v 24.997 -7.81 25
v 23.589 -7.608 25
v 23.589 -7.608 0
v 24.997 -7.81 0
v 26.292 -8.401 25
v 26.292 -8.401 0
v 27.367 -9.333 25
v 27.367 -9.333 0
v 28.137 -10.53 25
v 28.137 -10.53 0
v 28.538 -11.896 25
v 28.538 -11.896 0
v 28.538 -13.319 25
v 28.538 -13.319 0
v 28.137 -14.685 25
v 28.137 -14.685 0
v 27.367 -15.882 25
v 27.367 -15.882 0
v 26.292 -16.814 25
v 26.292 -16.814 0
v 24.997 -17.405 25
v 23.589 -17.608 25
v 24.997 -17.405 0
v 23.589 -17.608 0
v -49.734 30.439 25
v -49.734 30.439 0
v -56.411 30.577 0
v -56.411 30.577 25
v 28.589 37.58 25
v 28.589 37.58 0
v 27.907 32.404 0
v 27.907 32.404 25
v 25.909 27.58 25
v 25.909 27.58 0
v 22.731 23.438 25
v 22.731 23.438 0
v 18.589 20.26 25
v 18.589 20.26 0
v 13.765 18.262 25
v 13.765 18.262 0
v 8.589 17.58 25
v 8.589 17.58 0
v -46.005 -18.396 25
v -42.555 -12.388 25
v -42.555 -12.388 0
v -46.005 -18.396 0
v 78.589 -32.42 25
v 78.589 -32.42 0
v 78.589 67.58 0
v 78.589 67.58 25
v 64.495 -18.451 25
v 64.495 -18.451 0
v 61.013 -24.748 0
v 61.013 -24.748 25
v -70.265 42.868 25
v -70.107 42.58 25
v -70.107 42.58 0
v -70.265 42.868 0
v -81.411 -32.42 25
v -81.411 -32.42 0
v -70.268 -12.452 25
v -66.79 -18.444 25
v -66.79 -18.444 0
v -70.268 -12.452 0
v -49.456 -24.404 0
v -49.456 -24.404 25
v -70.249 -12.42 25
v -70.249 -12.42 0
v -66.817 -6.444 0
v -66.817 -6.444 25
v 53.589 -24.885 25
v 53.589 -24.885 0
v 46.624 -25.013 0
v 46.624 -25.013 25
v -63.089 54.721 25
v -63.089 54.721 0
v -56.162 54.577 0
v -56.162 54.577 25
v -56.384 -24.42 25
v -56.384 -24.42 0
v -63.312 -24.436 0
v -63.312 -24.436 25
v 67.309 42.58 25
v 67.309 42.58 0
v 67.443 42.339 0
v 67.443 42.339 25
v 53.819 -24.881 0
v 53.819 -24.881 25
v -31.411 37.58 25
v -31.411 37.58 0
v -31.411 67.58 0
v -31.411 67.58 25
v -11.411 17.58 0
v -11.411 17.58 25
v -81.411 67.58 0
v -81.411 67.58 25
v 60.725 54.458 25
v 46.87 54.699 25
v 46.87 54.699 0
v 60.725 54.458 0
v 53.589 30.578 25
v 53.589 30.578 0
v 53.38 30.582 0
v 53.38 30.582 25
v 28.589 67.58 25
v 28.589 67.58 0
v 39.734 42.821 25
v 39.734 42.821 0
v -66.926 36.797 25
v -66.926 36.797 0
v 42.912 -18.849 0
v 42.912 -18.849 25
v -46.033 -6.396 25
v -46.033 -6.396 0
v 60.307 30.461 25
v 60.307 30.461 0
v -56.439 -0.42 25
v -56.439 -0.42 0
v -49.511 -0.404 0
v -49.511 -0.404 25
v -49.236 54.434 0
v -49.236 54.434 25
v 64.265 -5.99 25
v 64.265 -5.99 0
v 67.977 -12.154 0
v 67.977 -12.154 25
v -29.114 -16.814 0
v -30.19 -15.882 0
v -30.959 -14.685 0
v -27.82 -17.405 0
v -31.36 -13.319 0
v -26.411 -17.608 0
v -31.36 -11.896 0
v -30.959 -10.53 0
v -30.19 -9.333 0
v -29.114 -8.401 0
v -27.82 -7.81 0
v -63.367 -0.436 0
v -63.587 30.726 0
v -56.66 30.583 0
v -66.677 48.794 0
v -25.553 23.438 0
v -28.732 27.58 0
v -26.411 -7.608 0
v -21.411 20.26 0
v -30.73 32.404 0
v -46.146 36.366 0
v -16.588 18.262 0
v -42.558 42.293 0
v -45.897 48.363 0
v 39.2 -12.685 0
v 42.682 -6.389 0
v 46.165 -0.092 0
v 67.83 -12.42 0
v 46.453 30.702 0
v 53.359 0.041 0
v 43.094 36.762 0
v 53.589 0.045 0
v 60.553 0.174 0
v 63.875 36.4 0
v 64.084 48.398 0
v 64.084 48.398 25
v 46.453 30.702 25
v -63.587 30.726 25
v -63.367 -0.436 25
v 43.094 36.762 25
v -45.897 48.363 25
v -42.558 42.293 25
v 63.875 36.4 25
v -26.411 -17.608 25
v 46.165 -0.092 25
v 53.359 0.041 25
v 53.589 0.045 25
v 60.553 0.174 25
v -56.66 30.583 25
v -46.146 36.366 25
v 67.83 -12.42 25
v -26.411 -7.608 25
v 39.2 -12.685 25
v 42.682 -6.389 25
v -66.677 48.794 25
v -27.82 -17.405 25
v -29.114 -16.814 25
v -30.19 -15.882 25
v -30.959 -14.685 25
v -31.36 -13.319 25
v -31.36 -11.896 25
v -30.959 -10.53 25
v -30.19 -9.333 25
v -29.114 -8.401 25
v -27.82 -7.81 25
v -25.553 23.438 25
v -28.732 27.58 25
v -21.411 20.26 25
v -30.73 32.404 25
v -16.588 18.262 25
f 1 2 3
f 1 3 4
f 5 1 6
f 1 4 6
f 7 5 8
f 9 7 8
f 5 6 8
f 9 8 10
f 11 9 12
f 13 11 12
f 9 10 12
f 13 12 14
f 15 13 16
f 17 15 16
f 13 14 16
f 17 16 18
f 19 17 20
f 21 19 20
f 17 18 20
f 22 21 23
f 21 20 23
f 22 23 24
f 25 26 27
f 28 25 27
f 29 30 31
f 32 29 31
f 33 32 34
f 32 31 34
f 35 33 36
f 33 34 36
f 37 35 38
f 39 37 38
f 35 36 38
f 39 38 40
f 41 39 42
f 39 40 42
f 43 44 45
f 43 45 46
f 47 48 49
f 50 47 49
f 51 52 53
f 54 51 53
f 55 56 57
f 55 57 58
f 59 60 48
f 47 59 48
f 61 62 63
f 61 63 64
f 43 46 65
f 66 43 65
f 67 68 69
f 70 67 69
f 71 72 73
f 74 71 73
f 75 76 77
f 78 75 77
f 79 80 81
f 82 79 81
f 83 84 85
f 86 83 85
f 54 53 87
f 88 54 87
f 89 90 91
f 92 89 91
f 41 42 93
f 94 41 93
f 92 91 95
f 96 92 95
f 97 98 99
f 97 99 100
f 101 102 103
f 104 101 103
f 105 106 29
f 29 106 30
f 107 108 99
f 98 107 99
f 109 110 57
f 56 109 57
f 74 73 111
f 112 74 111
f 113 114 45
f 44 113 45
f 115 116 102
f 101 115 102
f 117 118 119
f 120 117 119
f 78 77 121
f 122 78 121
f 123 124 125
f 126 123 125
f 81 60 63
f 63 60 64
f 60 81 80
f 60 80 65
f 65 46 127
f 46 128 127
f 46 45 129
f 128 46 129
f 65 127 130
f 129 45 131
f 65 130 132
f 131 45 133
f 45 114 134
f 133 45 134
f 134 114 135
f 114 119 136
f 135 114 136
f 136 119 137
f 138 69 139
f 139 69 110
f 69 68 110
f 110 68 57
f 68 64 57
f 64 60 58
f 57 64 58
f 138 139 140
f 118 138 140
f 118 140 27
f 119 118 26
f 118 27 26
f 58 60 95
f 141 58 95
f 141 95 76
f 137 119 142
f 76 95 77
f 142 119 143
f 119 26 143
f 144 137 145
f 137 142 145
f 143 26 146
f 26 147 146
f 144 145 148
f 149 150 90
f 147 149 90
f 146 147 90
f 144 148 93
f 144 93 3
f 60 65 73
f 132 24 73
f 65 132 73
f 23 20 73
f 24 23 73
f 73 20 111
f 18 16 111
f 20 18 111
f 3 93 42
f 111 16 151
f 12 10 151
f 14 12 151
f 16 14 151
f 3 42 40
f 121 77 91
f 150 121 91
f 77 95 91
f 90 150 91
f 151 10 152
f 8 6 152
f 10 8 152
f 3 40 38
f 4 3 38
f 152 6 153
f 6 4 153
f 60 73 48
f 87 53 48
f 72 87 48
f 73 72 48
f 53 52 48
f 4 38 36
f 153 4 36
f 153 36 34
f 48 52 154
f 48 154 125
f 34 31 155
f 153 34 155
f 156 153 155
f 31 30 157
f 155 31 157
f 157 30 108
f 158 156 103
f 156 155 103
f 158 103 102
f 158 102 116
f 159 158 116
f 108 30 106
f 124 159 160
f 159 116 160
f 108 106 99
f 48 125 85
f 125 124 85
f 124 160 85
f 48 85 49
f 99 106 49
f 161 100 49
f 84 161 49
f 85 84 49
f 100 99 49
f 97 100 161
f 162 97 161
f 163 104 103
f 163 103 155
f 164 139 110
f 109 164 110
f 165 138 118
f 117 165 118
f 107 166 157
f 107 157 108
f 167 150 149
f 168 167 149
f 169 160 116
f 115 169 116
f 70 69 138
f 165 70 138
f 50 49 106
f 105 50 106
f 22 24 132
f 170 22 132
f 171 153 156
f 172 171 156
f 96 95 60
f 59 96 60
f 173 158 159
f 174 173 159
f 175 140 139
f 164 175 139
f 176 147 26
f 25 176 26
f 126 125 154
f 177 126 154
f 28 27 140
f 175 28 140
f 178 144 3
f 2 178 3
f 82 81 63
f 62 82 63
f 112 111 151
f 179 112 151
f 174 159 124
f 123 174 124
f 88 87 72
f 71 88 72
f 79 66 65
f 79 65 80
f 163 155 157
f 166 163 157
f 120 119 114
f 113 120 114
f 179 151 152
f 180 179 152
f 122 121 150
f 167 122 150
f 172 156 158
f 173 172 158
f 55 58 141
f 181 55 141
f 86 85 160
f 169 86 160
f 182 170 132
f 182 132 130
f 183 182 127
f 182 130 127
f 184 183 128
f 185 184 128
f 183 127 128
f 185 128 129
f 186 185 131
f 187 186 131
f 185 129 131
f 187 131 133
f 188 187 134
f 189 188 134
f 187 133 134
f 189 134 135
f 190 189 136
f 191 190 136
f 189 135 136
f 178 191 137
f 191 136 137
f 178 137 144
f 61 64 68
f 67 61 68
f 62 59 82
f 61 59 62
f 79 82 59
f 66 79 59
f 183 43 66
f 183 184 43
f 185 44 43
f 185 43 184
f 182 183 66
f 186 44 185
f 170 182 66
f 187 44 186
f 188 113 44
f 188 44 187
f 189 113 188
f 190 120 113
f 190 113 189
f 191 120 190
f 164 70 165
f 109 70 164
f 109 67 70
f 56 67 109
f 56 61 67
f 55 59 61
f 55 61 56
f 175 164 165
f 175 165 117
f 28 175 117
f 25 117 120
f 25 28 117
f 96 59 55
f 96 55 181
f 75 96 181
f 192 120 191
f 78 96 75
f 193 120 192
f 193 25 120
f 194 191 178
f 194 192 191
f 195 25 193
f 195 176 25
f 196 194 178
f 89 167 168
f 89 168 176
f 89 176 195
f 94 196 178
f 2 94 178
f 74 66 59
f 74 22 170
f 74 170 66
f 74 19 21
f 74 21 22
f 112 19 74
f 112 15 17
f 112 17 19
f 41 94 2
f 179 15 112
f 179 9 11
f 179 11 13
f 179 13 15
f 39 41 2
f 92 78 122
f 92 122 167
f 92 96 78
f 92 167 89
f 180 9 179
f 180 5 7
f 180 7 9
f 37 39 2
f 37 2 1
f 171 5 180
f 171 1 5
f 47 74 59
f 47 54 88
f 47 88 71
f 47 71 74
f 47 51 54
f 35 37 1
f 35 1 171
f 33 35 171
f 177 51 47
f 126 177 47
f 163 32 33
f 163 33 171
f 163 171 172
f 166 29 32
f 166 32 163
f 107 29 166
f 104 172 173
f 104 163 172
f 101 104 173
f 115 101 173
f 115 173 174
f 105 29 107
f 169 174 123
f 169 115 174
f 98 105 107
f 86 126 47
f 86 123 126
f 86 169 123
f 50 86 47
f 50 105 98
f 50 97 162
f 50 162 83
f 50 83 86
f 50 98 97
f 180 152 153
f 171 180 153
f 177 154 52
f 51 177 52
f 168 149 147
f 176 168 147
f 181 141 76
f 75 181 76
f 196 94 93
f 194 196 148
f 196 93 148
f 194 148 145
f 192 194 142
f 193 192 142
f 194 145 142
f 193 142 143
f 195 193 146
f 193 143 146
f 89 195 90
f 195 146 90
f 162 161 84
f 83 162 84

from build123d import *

# Parameters (mm, degrees)
F1_DEPTH = 25


with BuildPart() as f1:
    # F0 (on Top) → F1 (new body)
    with BuildSketch(Plane.XY):
        with BuildLine():
            Line((-31.411291, 67.580059), (-81.411291, 67.580059))
            Line((-81.411291, 67.580059), (-81.411291, 42.580059))
            Line((-81.411291, 42.580059), (-81.411291, -6.443731))
            Line((-81.411291, -6.443731), (-81.411291, -12.419941))
            Line((-81.411291, -12.419941), (-81.411291, -32.419941))
            Line((-81.411291, -32.419941), (-56.411291, -32.419941))
            Line((-56.411291, -32.419941), (-31.411291, -32.419941))
            Line((-31.411291, -32.419941), (-26.411291, -32.419941))
            Line((-26.411291, -32.419941), (28.588709, -32.419941))
            Line((28.588709, -32.419941), (53.588709, -32.419941))
            Line((53.588709, -32.419941), (78.588709, -32.419941))
            Line((78.588709, -32.419941), (78.588709, 42.580059))
            Line((78.588709, 42.580059), (78.588709, 67.580059))
            Line((78.588709, 67.580059), (28.588709, 67.580059))
            Line((28.588709, 67.580059), (28.588709, 37.580059))
            ThreePointArc((28.588709, 37.580059), (22.730845, 23.437924), (8.588709, 17.580059))
            Line((8.588709, 17.580059), (-11.411291, 17.580059))
            ThreePointArc((-11.411291, 17.580059), (-25.553426, 23.437924), (-31.411291, 37.580059))
            Line((-31.411291, 37.580059), (-31.411291, 67.580059))
        make_face()
        Polygon((-70.267661, -12.45164), (-70.249456, -12.419941), (-66.817294, -6.44373), (-63.366928, -0.435822), (-56.438742, -0.419972), (-49.510558, -0.404123), (-46.032739, -6.396182), (-42.554921, -12.388242), (-46.005287, -18.396151), (-49.455654, -24.40406), (-56.383839, -24.419909), (-63.312024, -24.435759), (-66.789843, -18.443699), align=None, mode=Mode.SUBTRACT)
        with BuildLine():
            ThreePointArc((-26.411291, -17.607526), (-31.411291, -12.607526), (-26.411291, -7.607526))
            Line((-26.411291, -7.607526), (23.588709, -7.607526))
            ThreePointArc((23.588709, -7.607526), (28.588709, -12.607526), (23.588709, -17.607526))
            Line((23.588709, -17.607526), (-26.411291, -17.607526))
        make_face(mode=Mode.SUBTRACT)
        Polygon((53.818598, -24.880686), (53.588709, -24.884927), (46.624383, -25.013412), (42.912332, -18.849403), (39.20028, -12.685393), (42.682443, -6.388658), (46.164606, -0.091922), (53.358821, 0.040804), (53.588709, 0.045045), (60.553035, 0.17353), (64.265087, -5.990479), (67.977138, -12.154488), (67.83034, -12.419941), (64.494975, -18.451224), (61.012812, -24.74796), align=None, mode=Mode.SUBTRACT)
        Polygon((-66.925847, 36.796972), (-70.10659, 42.580059), (-70.264714, 42.867554), (-66.67687, 48.794388), (-63.089025, 54.721223), (-56.162314, 54.577476), (-49.235601, 54.433729), (-45.896734, 48.363146), (-42.557867, 42.292564), (-46.145712, 36.36573), (-49.733557, 30.438895), (-56.411291, 30.577475), (-56.660269, 30.582642), (-63.58698, 30.72639), align=None, mode=Mode.SUBTRACT)
        Polygon((64.083761, 48.398469), (67.309461, 42.580059), (67.443021, 42.339147), (63.875125, 36.400282), (60.30723, 30.461417), (53.588709, 30.578245), (53.380073, 30.581873), (46.452918, 30.702329), (43.093658, 36.761649), (39.734397, 42.820971), (43.302293, 48.759836), (46.870189, 54.698701), (53.797345, 54.578245), (60.724501, 54.457789), align=None, mode=Mode.SUBTRACT)
    extrude(amount=F1_DEPTH)


solid = f1.part
